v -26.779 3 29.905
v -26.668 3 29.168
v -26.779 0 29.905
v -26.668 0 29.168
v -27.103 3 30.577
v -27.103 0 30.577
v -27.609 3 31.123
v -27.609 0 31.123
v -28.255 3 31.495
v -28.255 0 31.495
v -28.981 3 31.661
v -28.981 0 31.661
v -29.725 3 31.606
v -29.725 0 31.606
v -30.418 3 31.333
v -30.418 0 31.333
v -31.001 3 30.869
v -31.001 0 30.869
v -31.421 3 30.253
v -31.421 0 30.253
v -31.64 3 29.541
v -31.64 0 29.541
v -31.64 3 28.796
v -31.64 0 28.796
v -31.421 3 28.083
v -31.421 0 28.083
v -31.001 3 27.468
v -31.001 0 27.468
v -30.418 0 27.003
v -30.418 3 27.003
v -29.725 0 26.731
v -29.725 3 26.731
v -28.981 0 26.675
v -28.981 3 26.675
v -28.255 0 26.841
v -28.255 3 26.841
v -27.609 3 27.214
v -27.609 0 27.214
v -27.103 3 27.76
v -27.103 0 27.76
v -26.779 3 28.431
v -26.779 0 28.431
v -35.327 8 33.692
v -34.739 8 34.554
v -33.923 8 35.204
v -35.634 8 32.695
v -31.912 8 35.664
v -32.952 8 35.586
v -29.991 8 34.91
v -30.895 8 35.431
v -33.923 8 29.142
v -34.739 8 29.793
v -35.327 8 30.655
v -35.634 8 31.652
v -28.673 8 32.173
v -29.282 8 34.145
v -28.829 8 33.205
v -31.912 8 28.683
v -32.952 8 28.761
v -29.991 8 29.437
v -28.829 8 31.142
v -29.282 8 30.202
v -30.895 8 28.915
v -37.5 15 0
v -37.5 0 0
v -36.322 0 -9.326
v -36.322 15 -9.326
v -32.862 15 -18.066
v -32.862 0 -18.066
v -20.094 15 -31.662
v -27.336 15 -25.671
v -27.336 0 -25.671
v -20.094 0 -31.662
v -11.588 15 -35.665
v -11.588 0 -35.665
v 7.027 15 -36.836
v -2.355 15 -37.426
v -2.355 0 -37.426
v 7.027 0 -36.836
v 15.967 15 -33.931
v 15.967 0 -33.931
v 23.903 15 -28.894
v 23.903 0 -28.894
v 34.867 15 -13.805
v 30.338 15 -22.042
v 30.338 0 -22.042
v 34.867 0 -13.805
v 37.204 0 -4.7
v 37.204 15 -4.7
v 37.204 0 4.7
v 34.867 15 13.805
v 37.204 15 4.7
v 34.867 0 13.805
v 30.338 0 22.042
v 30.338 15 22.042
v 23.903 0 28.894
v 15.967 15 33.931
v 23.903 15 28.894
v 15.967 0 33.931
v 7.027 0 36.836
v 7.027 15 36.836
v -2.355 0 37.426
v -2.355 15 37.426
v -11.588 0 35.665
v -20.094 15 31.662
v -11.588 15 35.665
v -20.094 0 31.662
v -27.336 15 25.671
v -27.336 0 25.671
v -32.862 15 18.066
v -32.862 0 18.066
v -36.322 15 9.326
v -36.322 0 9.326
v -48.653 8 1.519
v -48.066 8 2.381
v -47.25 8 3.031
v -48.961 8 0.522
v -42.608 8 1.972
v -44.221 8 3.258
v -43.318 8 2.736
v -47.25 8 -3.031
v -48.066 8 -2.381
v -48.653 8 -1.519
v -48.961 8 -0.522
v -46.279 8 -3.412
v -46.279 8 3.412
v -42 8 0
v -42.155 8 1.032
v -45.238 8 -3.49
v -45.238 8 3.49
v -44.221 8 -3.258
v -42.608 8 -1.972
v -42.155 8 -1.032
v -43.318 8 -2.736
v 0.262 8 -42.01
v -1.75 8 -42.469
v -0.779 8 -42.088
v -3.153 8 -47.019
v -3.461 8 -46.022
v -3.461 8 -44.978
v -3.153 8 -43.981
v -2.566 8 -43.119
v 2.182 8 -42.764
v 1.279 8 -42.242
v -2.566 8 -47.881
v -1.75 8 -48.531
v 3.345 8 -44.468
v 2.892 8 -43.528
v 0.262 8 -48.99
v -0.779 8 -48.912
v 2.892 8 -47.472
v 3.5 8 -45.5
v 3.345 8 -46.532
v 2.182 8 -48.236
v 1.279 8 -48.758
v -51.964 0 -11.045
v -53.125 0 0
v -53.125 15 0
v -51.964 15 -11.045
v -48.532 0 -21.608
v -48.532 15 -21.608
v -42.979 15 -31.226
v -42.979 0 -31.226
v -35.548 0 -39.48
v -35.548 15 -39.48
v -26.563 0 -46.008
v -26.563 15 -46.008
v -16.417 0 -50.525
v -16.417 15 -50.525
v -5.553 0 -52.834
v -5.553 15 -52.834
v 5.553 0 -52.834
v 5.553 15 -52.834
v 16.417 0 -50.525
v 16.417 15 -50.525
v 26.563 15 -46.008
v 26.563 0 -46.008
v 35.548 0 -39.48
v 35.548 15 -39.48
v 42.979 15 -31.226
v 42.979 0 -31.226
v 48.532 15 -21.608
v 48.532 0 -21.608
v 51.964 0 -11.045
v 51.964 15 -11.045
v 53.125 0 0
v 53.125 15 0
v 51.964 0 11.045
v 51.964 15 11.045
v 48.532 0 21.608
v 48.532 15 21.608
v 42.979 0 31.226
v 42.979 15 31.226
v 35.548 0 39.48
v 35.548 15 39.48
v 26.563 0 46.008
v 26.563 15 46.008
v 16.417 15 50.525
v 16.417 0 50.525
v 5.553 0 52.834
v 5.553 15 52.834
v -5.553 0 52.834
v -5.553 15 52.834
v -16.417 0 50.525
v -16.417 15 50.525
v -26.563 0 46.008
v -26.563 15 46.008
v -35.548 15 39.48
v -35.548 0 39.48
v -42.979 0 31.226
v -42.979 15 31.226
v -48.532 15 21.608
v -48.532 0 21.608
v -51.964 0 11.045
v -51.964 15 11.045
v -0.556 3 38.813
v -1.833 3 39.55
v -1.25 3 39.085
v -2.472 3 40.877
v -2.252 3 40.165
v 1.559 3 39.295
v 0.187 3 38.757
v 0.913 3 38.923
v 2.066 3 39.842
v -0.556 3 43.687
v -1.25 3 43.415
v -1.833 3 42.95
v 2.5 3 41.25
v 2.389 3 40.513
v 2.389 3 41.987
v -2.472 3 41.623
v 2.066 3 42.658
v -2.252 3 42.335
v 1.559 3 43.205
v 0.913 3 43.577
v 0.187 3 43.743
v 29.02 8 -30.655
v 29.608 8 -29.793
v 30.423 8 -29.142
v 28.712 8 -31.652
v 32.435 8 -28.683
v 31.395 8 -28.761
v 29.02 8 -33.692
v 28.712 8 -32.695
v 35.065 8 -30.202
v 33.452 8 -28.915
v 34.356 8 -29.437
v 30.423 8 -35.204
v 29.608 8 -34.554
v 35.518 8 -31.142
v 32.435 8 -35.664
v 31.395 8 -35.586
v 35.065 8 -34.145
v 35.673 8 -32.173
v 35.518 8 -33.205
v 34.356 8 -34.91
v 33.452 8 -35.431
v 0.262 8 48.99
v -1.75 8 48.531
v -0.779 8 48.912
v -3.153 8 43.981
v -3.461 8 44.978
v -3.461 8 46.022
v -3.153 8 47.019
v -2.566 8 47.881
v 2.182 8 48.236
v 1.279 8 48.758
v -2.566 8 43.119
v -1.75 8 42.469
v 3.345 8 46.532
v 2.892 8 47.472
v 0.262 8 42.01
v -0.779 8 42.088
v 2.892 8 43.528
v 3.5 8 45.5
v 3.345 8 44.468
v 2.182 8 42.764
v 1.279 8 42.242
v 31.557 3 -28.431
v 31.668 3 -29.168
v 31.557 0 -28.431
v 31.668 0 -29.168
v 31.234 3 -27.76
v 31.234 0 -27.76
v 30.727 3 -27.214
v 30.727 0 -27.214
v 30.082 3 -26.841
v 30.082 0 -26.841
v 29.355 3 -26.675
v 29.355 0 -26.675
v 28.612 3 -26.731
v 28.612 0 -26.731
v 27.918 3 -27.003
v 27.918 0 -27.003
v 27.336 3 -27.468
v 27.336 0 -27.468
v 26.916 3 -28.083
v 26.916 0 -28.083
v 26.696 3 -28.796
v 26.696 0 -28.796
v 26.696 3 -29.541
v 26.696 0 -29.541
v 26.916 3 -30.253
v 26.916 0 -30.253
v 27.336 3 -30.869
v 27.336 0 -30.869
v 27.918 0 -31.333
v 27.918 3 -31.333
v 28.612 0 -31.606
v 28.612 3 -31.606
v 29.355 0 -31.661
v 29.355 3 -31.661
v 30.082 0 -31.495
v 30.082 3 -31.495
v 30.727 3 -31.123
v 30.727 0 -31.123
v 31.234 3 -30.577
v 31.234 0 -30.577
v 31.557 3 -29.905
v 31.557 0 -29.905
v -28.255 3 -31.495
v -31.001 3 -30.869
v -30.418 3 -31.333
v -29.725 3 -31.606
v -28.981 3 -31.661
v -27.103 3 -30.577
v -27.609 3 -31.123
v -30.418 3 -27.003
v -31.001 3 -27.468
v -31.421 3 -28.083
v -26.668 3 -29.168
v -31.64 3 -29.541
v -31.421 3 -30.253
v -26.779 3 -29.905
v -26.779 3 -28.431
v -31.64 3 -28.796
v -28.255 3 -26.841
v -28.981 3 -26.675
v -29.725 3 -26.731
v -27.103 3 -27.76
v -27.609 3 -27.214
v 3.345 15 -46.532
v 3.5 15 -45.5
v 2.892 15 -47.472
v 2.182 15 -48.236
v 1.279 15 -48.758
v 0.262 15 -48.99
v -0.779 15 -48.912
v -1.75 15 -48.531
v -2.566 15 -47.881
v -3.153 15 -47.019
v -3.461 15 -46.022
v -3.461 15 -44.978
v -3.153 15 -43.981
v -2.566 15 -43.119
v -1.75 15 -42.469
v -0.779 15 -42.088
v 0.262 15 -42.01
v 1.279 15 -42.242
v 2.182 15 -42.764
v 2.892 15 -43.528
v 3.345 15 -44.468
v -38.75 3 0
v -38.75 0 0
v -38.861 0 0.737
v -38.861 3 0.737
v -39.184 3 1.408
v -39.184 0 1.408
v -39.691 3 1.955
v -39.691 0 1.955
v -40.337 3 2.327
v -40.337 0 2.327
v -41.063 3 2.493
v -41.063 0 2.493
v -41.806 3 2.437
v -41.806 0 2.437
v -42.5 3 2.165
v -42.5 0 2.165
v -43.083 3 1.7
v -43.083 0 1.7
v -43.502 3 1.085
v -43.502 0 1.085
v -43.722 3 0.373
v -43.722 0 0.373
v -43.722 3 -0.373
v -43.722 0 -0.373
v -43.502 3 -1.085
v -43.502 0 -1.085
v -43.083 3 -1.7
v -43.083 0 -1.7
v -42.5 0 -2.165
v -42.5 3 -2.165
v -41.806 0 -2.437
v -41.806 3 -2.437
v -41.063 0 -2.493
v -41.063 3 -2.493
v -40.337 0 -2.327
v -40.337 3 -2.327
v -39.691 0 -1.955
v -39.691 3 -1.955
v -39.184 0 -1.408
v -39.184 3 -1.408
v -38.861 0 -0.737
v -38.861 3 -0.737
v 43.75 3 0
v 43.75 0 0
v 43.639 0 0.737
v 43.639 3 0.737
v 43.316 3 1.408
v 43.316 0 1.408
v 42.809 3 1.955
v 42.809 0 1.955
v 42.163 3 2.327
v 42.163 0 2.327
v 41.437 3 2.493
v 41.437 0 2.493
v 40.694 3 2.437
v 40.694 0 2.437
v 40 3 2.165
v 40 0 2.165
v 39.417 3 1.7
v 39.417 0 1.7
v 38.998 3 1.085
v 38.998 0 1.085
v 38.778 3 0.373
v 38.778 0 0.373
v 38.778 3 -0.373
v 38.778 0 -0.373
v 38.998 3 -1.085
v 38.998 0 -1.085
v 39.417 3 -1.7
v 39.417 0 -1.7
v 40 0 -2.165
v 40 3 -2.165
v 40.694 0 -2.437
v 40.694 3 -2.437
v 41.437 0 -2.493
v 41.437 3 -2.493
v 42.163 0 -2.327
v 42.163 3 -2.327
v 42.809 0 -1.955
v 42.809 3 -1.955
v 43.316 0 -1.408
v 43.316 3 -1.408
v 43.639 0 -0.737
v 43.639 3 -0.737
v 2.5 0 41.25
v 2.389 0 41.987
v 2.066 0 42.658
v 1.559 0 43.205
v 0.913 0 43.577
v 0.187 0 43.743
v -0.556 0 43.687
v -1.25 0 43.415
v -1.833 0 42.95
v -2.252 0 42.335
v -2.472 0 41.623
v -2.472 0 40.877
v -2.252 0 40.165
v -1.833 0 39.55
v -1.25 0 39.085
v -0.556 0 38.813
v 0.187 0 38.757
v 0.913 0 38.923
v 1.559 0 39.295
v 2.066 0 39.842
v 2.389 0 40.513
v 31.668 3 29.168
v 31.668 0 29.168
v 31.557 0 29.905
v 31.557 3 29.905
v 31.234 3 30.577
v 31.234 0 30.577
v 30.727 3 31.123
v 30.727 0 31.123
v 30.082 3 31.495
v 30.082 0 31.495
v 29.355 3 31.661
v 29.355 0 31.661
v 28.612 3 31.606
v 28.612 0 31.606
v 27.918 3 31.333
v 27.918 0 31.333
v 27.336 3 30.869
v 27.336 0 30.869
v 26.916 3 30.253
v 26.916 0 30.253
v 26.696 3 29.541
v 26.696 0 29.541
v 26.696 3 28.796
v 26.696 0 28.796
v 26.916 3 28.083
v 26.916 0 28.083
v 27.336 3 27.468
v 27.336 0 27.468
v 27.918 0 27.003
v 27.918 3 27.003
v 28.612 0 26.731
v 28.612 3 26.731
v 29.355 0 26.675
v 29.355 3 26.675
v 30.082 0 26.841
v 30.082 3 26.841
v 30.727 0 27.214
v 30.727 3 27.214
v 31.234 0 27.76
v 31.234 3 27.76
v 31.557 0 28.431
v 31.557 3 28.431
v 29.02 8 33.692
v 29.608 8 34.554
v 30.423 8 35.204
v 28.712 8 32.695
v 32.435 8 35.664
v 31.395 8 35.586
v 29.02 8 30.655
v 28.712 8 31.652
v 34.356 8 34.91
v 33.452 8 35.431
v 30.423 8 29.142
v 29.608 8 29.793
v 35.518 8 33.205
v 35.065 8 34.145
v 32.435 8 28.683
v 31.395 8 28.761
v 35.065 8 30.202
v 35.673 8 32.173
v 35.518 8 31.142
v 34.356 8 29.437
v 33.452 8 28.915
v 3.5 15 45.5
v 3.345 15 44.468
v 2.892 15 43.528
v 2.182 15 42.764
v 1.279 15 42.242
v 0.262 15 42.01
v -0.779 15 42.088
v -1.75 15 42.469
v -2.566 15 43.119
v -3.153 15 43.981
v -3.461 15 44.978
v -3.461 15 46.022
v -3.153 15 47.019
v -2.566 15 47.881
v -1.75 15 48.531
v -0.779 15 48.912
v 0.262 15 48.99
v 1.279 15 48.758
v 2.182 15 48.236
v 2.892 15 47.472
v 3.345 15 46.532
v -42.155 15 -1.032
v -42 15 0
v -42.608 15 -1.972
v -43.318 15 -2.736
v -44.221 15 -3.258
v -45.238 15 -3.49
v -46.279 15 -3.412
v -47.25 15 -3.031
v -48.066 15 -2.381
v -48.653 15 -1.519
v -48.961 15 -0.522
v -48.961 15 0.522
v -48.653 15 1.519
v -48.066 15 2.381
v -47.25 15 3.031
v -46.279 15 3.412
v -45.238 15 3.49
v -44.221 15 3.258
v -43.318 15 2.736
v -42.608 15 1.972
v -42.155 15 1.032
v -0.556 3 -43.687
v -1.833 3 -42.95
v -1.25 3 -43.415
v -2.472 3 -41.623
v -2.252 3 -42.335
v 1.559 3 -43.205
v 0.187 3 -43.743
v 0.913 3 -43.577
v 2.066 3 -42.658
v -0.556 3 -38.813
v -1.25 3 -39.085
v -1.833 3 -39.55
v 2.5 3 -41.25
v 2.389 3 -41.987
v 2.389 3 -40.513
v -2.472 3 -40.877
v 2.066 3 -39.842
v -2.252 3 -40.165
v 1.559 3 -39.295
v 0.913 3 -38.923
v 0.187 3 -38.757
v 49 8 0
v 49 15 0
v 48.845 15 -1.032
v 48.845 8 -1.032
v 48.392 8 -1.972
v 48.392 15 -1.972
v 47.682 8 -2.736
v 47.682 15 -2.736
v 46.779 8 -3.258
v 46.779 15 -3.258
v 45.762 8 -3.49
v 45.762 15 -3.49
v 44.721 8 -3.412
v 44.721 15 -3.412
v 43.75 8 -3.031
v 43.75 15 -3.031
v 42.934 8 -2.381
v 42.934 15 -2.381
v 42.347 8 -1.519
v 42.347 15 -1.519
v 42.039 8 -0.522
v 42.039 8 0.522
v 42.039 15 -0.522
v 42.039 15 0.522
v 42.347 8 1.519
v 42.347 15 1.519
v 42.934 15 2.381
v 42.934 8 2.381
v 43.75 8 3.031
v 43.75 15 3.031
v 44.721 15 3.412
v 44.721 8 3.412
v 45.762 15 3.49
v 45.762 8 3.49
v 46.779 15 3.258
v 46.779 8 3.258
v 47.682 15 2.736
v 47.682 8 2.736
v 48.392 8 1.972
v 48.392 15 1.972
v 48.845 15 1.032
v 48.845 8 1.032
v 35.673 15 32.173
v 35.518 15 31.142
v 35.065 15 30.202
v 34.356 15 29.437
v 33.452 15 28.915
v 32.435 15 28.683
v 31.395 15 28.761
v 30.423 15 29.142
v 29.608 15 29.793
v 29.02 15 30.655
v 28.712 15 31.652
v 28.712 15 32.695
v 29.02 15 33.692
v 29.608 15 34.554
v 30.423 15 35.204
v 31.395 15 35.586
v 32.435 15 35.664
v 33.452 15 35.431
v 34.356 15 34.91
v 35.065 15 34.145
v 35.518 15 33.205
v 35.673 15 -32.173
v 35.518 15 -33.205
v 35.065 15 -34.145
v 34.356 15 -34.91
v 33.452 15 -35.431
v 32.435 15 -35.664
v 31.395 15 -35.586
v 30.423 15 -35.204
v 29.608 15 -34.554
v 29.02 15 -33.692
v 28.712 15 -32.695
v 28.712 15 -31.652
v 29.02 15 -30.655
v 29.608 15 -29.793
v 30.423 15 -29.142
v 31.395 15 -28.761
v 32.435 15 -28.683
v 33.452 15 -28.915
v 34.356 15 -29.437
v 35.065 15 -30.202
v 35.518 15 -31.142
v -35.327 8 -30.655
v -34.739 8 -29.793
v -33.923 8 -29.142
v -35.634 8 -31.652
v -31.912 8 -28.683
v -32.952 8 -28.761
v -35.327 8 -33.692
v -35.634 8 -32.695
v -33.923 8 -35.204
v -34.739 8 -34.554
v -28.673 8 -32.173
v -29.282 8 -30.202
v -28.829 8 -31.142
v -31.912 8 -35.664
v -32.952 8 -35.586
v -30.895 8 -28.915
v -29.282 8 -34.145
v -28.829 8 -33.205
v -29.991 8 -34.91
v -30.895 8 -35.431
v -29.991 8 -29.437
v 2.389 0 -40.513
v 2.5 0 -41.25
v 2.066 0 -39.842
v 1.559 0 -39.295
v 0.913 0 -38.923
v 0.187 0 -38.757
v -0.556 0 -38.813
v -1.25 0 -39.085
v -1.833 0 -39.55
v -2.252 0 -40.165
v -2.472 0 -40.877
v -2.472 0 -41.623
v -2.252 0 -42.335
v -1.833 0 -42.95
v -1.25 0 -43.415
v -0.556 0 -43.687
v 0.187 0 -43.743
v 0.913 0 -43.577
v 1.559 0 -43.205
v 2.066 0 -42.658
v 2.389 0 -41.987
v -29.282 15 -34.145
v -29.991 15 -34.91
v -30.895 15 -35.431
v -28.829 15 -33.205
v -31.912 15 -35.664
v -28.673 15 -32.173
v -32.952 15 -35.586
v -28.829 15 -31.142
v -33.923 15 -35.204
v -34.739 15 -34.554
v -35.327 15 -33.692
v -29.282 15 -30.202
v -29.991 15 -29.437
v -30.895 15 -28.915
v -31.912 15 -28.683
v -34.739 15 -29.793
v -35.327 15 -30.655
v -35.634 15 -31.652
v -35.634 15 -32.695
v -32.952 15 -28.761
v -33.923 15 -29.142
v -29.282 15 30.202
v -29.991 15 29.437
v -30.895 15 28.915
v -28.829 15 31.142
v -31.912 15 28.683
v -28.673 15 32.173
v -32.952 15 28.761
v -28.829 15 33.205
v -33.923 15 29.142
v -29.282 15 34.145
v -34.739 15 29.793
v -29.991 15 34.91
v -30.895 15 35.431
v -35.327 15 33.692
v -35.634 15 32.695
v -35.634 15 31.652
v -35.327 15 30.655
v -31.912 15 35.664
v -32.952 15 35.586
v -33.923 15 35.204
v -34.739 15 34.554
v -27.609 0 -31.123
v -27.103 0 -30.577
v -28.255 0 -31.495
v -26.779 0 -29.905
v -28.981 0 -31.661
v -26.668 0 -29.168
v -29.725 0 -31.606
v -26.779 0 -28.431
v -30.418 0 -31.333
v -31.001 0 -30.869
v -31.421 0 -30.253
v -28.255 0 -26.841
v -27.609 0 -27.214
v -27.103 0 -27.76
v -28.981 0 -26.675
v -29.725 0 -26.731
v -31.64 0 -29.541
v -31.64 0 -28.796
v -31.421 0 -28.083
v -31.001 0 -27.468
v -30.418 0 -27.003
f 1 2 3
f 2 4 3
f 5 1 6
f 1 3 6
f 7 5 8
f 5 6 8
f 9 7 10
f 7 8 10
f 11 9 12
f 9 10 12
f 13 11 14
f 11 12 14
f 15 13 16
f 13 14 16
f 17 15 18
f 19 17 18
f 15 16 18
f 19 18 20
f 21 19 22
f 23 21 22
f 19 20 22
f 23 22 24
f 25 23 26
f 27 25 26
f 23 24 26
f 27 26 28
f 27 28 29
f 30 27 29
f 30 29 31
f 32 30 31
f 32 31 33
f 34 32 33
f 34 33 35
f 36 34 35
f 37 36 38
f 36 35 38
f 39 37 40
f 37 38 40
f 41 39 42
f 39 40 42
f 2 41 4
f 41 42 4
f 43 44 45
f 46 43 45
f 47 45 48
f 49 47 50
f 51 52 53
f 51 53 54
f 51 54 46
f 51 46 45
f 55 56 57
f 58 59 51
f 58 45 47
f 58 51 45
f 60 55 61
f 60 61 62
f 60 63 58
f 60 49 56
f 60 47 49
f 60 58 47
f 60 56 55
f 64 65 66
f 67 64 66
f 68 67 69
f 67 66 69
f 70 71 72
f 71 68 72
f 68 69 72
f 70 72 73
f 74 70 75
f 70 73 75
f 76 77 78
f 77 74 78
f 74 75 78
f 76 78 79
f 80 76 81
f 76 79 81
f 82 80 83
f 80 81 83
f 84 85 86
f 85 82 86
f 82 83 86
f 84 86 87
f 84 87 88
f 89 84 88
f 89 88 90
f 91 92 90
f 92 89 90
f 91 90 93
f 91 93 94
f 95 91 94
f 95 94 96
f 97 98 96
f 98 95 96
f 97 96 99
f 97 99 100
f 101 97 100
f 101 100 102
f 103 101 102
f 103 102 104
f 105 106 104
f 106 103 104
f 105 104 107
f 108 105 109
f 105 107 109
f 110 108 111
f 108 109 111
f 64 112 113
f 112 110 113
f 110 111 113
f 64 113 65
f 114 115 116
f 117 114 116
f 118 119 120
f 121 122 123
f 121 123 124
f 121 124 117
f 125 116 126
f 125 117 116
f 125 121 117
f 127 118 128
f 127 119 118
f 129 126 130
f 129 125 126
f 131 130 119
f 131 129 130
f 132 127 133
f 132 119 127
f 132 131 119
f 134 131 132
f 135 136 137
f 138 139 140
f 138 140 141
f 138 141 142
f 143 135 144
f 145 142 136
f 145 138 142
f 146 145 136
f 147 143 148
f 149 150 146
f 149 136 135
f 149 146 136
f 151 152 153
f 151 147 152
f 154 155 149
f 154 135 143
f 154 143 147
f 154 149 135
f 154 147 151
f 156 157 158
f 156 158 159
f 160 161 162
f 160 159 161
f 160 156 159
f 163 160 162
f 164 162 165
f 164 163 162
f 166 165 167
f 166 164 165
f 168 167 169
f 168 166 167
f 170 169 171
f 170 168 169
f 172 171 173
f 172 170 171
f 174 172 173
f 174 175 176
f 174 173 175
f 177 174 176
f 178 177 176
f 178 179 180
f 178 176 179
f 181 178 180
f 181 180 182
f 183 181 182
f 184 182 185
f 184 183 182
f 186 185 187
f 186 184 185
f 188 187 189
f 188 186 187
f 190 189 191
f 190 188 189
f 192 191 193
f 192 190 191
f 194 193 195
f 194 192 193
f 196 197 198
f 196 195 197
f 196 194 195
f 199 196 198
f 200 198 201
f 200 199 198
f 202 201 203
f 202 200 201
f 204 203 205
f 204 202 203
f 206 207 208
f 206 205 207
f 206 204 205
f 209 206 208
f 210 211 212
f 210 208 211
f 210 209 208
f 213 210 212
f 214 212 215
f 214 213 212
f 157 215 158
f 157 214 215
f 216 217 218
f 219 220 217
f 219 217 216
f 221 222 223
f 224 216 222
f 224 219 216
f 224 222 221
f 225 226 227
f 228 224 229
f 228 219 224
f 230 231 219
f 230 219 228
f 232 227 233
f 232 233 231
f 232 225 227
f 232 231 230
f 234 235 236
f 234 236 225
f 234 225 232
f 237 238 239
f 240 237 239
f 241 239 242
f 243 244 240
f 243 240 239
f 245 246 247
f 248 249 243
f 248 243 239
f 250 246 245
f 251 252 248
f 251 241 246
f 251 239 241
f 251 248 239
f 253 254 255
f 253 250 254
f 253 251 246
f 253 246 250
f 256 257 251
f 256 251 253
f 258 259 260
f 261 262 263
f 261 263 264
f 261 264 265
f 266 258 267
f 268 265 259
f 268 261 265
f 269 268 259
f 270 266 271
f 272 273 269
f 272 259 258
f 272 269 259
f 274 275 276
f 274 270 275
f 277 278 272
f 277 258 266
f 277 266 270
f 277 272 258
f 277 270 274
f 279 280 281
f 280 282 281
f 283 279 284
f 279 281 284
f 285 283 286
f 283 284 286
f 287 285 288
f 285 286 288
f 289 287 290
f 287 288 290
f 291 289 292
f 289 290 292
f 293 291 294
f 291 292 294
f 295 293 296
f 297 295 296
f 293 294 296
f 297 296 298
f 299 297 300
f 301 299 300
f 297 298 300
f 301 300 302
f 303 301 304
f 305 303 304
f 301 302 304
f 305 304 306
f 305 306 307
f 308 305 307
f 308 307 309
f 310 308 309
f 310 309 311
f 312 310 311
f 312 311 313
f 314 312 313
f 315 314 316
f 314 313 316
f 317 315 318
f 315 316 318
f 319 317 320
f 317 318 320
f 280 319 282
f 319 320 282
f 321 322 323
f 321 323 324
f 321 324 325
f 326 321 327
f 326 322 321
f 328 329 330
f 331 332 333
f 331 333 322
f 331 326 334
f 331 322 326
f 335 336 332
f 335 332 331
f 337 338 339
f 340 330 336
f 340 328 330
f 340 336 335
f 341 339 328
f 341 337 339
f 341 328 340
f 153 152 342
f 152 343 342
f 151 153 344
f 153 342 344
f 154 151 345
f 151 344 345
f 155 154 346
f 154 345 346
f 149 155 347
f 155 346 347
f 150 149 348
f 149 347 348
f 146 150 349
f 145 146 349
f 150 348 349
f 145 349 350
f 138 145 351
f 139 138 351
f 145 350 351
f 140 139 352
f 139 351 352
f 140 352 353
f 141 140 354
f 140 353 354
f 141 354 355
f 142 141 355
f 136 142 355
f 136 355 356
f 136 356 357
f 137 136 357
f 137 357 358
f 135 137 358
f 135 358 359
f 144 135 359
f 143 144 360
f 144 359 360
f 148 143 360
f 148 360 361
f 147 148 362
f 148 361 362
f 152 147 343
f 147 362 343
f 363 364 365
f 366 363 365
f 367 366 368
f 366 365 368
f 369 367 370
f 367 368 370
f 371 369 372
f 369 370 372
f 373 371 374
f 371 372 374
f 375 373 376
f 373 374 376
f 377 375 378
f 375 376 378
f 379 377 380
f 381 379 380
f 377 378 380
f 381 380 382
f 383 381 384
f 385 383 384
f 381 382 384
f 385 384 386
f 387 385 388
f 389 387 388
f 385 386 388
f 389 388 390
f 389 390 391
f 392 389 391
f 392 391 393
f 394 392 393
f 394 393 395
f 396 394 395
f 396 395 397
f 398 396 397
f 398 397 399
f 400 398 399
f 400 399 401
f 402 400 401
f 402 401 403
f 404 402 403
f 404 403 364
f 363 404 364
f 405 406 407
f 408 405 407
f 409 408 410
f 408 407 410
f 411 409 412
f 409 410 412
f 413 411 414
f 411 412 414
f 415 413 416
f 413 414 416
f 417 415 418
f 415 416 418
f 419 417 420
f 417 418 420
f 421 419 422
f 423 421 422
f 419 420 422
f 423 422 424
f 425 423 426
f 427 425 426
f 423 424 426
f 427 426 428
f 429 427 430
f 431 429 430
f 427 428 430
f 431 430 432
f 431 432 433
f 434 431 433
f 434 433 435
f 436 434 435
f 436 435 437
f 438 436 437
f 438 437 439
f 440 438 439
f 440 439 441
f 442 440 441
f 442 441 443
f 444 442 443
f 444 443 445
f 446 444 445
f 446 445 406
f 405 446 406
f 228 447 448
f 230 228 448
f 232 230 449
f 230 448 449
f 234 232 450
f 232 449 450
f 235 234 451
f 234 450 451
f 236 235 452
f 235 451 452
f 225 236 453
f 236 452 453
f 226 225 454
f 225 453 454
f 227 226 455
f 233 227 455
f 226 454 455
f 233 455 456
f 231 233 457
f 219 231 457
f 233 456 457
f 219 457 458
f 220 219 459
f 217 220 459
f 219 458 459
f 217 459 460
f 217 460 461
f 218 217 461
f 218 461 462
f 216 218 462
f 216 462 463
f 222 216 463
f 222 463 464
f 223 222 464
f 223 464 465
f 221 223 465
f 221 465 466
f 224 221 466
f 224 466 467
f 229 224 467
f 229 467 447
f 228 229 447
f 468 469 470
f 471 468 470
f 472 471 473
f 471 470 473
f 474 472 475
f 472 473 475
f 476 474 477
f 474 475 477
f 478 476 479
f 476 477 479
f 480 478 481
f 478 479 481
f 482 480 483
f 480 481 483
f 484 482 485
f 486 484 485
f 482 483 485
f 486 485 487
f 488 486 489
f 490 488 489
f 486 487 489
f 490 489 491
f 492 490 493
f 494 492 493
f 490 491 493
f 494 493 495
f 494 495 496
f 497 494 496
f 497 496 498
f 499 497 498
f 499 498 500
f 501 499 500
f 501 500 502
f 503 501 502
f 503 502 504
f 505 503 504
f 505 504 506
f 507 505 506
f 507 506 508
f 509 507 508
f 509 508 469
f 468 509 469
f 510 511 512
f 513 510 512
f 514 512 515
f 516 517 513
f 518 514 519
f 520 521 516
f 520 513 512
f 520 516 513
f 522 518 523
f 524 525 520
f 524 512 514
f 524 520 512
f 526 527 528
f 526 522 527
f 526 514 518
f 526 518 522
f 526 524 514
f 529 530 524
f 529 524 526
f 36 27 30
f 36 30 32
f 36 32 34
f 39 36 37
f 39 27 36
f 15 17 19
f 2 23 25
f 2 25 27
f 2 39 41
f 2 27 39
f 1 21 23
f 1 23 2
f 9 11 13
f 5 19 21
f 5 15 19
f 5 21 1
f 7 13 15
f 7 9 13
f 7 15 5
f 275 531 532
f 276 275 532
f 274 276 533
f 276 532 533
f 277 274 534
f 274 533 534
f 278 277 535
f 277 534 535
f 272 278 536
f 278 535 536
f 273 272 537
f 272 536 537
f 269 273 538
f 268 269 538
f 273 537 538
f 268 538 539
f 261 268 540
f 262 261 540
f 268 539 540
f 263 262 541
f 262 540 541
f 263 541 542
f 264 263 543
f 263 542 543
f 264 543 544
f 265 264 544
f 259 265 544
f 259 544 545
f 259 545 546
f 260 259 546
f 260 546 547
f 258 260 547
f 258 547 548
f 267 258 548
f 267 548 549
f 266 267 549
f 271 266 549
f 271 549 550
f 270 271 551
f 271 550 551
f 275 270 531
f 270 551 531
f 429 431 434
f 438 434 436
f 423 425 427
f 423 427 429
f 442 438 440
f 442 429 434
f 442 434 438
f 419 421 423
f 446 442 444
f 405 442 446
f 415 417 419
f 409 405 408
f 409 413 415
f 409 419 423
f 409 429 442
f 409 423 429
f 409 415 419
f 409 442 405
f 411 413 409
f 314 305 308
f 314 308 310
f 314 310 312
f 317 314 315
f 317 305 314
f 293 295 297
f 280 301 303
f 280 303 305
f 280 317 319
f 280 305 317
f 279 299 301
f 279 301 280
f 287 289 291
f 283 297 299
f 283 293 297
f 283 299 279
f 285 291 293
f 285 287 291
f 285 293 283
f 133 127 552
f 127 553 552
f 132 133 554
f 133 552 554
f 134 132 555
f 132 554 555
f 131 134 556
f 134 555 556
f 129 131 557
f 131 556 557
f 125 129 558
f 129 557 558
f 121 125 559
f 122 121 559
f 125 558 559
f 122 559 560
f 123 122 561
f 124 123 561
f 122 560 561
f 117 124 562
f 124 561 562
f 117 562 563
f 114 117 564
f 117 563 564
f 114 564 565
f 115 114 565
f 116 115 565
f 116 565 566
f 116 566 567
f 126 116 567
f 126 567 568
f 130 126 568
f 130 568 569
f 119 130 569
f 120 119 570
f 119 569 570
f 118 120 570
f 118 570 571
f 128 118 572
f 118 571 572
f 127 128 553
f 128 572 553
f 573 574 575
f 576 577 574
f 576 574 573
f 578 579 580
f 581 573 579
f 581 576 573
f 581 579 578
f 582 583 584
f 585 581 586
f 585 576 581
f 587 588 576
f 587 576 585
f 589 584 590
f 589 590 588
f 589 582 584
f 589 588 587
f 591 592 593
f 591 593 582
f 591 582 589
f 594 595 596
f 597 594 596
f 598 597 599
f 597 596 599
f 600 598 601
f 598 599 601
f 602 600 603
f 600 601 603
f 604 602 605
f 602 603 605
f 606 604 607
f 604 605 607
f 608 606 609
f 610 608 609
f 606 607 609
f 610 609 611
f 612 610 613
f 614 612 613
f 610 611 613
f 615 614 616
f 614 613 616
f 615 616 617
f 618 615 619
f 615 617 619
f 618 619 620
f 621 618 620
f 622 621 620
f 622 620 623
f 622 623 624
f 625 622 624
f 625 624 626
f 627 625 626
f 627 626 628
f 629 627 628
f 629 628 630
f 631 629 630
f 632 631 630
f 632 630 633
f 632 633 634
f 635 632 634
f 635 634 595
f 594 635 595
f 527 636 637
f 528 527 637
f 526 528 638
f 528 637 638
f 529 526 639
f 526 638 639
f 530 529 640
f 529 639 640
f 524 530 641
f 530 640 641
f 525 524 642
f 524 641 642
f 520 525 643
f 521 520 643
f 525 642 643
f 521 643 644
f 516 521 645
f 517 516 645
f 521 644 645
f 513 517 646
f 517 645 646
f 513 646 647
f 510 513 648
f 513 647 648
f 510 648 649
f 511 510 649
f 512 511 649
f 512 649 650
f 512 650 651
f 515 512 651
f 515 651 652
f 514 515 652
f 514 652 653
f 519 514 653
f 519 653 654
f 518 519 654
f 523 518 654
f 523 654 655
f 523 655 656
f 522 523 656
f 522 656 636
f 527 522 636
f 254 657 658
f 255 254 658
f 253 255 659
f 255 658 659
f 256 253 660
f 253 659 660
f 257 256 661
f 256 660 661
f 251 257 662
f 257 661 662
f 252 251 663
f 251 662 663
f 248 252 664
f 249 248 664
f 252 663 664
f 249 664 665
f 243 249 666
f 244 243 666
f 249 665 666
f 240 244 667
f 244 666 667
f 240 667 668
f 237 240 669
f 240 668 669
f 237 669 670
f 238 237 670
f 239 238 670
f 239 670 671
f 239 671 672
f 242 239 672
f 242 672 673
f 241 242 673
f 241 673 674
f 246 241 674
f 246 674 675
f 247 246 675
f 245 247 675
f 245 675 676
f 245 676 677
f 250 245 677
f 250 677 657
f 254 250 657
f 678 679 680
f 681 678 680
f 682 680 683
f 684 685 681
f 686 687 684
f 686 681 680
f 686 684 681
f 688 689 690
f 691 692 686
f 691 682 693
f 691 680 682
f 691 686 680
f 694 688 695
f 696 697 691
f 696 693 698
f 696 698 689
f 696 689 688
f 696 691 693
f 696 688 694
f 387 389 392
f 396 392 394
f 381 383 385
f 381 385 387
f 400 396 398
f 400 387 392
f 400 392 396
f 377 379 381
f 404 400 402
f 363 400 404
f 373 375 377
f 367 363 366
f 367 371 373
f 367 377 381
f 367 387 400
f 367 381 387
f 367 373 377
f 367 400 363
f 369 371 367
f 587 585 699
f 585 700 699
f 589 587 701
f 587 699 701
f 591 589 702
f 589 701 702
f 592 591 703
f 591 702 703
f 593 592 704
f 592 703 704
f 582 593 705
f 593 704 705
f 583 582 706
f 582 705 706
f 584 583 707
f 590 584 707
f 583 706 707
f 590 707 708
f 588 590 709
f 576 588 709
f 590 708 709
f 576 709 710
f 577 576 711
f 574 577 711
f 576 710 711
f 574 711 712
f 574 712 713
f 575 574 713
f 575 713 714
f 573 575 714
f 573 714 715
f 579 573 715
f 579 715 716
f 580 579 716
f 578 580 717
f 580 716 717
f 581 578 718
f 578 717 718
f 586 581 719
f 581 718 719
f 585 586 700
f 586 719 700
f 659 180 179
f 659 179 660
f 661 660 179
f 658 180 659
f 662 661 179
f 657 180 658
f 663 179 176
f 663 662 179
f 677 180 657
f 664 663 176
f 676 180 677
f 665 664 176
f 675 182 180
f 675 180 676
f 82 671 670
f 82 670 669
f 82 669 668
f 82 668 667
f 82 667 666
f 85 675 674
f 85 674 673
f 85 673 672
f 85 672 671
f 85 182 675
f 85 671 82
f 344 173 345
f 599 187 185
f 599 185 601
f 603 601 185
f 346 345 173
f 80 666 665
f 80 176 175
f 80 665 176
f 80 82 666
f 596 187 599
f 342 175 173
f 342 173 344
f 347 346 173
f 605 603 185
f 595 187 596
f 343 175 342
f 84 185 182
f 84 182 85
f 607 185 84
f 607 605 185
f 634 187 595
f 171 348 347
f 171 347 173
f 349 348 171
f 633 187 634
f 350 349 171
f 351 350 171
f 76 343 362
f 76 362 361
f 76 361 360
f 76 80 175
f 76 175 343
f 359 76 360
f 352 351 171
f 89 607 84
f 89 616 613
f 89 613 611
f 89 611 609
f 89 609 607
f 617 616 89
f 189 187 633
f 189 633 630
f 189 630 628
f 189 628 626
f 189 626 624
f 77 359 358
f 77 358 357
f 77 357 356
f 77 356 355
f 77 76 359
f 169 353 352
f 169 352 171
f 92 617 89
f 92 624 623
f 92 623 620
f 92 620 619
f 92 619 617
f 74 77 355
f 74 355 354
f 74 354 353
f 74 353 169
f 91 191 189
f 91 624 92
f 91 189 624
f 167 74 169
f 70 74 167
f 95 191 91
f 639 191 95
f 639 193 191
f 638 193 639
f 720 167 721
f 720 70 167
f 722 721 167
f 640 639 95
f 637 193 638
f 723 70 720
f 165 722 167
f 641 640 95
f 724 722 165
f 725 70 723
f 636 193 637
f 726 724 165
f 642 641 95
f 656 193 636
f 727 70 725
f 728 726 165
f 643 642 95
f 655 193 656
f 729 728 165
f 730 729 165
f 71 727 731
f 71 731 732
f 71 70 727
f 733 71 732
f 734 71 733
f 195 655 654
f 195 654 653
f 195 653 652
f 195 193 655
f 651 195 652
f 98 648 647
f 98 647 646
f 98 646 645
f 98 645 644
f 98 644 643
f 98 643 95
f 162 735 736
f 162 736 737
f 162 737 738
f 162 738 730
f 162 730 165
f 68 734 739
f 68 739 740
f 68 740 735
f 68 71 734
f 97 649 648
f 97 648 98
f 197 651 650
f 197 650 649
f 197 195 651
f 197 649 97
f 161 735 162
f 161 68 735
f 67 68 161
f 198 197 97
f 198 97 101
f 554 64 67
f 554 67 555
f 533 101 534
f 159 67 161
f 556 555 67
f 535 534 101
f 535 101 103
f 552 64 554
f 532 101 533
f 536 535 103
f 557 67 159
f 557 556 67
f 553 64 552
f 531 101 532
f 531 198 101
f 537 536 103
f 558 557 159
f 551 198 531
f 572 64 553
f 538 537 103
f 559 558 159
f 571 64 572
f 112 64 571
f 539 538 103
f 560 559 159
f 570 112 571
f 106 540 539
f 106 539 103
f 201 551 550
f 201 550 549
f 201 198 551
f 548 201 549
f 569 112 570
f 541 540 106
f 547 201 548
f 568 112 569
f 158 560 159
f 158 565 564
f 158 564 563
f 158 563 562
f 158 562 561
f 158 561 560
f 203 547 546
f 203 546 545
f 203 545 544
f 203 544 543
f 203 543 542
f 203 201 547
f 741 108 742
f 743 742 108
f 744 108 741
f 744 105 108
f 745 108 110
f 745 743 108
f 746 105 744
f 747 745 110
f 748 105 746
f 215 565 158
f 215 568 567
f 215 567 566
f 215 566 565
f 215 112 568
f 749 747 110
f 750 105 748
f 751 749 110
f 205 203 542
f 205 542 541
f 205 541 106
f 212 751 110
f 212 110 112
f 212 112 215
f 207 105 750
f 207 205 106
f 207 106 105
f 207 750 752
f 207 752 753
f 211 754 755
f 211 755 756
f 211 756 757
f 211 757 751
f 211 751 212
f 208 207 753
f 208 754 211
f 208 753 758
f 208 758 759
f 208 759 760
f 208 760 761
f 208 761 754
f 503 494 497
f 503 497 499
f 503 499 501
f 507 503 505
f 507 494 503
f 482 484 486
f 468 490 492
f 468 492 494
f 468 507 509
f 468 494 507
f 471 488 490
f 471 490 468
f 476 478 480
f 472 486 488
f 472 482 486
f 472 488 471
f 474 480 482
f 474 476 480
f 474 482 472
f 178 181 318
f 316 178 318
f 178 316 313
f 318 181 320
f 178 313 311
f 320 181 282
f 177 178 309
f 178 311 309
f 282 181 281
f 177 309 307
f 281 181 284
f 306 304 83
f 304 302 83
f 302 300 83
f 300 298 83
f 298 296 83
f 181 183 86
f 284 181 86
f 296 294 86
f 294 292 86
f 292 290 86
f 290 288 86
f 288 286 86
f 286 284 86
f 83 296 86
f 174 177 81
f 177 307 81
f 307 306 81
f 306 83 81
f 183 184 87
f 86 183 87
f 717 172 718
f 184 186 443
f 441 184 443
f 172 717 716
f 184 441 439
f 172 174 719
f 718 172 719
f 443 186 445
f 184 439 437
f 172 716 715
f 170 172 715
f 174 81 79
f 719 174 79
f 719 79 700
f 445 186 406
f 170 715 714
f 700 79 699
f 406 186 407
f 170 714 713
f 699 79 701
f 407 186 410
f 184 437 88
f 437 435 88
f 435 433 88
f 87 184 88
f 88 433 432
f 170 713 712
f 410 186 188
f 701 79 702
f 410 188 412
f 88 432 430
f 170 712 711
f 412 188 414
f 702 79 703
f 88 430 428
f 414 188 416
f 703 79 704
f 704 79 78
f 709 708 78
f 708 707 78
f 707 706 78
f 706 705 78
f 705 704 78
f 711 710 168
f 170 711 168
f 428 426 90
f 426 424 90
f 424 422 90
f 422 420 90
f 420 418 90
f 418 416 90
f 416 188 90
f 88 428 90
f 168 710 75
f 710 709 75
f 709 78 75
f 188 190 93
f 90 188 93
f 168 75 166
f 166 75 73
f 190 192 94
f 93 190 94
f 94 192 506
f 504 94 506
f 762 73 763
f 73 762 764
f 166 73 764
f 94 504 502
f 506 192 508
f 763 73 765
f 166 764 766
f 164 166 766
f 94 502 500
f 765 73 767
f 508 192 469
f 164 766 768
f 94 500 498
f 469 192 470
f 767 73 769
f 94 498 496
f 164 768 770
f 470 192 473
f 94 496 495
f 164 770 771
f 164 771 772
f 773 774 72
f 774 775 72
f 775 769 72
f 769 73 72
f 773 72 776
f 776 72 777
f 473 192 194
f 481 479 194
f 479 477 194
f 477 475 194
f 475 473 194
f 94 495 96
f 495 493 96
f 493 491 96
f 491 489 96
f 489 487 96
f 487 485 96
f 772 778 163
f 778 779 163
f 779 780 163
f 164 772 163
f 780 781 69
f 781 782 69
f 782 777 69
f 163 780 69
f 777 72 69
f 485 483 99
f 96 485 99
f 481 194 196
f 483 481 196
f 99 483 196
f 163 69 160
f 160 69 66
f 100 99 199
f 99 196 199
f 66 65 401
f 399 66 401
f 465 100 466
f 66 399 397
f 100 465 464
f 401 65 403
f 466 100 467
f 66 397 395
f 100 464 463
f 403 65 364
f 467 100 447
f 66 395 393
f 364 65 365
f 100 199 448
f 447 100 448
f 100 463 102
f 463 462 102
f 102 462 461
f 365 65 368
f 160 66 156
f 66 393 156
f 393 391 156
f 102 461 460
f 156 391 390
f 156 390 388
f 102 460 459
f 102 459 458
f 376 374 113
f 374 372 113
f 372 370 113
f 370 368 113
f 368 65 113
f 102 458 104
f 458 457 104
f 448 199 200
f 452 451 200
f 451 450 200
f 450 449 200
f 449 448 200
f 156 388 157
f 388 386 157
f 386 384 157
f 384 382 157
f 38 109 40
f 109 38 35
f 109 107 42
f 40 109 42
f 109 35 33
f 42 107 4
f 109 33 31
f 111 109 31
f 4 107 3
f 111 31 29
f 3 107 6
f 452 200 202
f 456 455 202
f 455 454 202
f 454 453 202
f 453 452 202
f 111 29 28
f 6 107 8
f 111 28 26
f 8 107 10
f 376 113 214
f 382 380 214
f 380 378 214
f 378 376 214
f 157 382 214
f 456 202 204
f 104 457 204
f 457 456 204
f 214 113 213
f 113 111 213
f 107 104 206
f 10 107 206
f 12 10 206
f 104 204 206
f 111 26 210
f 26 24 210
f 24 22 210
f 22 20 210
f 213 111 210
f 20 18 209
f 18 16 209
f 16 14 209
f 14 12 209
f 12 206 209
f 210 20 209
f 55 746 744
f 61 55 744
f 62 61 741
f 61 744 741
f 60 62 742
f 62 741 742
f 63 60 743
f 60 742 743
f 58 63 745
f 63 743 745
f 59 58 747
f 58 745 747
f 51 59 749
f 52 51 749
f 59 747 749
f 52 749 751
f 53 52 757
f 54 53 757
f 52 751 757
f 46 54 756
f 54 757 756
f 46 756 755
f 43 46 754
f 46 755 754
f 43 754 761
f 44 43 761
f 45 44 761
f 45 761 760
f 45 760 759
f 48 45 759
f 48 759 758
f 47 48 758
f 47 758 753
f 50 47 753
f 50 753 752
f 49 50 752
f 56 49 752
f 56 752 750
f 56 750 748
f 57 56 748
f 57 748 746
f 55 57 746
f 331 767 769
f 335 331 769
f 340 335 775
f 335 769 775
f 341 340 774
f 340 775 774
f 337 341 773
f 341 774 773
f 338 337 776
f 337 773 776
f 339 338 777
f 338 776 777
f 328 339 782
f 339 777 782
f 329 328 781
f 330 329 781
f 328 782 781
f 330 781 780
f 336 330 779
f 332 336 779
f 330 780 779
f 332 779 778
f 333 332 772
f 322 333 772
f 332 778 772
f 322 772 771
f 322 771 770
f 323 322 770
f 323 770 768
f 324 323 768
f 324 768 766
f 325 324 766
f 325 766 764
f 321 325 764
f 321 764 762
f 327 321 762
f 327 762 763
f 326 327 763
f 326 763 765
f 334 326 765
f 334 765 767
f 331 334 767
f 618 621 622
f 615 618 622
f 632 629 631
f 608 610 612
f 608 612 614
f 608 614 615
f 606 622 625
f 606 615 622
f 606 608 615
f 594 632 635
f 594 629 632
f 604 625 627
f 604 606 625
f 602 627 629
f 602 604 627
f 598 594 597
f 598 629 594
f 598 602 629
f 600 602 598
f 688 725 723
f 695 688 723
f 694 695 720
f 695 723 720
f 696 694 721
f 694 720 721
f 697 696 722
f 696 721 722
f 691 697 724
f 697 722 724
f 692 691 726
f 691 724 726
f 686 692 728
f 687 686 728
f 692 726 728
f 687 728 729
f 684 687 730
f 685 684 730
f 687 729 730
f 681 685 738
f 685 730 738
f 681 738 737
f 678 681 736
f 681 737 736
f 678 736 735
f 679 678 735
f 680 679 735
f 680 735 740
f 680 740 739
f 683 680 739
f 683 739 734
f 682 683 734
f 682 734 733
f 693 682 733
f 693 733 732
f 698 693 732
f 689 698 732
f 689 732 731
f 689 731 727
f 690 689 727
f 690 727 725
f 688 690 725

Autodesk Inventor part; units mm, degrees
ref_plane "YZ Plane" through (0, 0, 0) normal (1, 0, 0) x (0, 1, 0)
ref_plane "XZ Plane" through (0, 0, 0) normal (0, 1, 0) x (-1, 0, 0)
ref_plane "XY Plane" through (0, 0, 0) normal (0, 0, 1) x (1, 0, 0)
sketch "Sketch1" plane through (0, 0, 0) normal (0, 1, 0) x (-1, 0, 0)
  circle A0 centre (0, 0) radius 53.125
  circle A1 centre (0, 0) radius 37.5
  dimension "d0" = 106.25
  dimension "d1" = 75
extrude "Extrusion1" add sketch "Sketch1" along normal blind 15
sketch "Sketch2" plane through (0, 0, 0) normal (0, -1, 0) x (1, 0, 0)
  circle A0 centre (0, 0) radius 41.25
  circle A1 centre (-41.25, 0) radius 2.5
  circle A2 centre (-29.1682, -29.1682) radius 2.5
  circle A3 centre (0, -41.25) radius 2.5
  circle A4 centre (29.1682, -29.1682) radius 2.5
  circle A5 centre (41.25, 0) radius 2.5
  circle A6 centre (29.1682, 29.1682) radius 2.5
  circle A7 centre (0, 41.25) radius 2.5
  circle A8 centre (-29.1682, 29.1682) radius 2.5
  dimension "d4" = 82.5
  dimension "d5" = 5
  dimension "d8" = 360
extrude "Extrusion2" cut sketch "Sketch2" against normal blind 3 contours A0 A5 | A0 A5 | A6 A0 | A0 A6 | A4 A0 | A0 A4 | A7 A0 | A0 A7 | A3 A0 | A0 A3 | A8 A0 | A0 A8 | A2 A0 | A0 A2 | A1 A0 | A0 A1
sketch "Sketch3" plane through (0, 15, 0) normal (0, 1, 0) x (1, 0, 0)
  circle A0 centre (0, 0) radius 45.5
  circle A1 centre (45.5, 0) radius 3.5
  circle A2 centre (32.1734, 32.1734) radius 3.5
  circle A3 centre (0, 45.5) radius 3.5
  circle A4 centre (-32.1734, 32.1734) radius 3.5
  circle A5 centre (-45.5, 0) radius 3.5
  circle A6 centre (-32.1734, -32.1734) radius 3.5
  circle A7 centre (0, -45.5) radius 3.5
  circle A8 centre (32.1734, -32.1734) radius 3.5
  dimension "d12" = 91
  dimension "d13" = 7
  dimension "d16" = 360
extrude "Extrusion3" cut sketch "Sketch3" against normal blind 7 contours A0 A1 | A0 A1 | A2 A0 | A0 A2 | A8 A0 | A0 A8 | A3 A0 | A0 A3 | A7 A0 | A0 A7 | A4 A0 | A0 A4 | A6 A0 | A0 A6 | A5 A0 | A0 A5
properties part number "Magnet Spacer"
